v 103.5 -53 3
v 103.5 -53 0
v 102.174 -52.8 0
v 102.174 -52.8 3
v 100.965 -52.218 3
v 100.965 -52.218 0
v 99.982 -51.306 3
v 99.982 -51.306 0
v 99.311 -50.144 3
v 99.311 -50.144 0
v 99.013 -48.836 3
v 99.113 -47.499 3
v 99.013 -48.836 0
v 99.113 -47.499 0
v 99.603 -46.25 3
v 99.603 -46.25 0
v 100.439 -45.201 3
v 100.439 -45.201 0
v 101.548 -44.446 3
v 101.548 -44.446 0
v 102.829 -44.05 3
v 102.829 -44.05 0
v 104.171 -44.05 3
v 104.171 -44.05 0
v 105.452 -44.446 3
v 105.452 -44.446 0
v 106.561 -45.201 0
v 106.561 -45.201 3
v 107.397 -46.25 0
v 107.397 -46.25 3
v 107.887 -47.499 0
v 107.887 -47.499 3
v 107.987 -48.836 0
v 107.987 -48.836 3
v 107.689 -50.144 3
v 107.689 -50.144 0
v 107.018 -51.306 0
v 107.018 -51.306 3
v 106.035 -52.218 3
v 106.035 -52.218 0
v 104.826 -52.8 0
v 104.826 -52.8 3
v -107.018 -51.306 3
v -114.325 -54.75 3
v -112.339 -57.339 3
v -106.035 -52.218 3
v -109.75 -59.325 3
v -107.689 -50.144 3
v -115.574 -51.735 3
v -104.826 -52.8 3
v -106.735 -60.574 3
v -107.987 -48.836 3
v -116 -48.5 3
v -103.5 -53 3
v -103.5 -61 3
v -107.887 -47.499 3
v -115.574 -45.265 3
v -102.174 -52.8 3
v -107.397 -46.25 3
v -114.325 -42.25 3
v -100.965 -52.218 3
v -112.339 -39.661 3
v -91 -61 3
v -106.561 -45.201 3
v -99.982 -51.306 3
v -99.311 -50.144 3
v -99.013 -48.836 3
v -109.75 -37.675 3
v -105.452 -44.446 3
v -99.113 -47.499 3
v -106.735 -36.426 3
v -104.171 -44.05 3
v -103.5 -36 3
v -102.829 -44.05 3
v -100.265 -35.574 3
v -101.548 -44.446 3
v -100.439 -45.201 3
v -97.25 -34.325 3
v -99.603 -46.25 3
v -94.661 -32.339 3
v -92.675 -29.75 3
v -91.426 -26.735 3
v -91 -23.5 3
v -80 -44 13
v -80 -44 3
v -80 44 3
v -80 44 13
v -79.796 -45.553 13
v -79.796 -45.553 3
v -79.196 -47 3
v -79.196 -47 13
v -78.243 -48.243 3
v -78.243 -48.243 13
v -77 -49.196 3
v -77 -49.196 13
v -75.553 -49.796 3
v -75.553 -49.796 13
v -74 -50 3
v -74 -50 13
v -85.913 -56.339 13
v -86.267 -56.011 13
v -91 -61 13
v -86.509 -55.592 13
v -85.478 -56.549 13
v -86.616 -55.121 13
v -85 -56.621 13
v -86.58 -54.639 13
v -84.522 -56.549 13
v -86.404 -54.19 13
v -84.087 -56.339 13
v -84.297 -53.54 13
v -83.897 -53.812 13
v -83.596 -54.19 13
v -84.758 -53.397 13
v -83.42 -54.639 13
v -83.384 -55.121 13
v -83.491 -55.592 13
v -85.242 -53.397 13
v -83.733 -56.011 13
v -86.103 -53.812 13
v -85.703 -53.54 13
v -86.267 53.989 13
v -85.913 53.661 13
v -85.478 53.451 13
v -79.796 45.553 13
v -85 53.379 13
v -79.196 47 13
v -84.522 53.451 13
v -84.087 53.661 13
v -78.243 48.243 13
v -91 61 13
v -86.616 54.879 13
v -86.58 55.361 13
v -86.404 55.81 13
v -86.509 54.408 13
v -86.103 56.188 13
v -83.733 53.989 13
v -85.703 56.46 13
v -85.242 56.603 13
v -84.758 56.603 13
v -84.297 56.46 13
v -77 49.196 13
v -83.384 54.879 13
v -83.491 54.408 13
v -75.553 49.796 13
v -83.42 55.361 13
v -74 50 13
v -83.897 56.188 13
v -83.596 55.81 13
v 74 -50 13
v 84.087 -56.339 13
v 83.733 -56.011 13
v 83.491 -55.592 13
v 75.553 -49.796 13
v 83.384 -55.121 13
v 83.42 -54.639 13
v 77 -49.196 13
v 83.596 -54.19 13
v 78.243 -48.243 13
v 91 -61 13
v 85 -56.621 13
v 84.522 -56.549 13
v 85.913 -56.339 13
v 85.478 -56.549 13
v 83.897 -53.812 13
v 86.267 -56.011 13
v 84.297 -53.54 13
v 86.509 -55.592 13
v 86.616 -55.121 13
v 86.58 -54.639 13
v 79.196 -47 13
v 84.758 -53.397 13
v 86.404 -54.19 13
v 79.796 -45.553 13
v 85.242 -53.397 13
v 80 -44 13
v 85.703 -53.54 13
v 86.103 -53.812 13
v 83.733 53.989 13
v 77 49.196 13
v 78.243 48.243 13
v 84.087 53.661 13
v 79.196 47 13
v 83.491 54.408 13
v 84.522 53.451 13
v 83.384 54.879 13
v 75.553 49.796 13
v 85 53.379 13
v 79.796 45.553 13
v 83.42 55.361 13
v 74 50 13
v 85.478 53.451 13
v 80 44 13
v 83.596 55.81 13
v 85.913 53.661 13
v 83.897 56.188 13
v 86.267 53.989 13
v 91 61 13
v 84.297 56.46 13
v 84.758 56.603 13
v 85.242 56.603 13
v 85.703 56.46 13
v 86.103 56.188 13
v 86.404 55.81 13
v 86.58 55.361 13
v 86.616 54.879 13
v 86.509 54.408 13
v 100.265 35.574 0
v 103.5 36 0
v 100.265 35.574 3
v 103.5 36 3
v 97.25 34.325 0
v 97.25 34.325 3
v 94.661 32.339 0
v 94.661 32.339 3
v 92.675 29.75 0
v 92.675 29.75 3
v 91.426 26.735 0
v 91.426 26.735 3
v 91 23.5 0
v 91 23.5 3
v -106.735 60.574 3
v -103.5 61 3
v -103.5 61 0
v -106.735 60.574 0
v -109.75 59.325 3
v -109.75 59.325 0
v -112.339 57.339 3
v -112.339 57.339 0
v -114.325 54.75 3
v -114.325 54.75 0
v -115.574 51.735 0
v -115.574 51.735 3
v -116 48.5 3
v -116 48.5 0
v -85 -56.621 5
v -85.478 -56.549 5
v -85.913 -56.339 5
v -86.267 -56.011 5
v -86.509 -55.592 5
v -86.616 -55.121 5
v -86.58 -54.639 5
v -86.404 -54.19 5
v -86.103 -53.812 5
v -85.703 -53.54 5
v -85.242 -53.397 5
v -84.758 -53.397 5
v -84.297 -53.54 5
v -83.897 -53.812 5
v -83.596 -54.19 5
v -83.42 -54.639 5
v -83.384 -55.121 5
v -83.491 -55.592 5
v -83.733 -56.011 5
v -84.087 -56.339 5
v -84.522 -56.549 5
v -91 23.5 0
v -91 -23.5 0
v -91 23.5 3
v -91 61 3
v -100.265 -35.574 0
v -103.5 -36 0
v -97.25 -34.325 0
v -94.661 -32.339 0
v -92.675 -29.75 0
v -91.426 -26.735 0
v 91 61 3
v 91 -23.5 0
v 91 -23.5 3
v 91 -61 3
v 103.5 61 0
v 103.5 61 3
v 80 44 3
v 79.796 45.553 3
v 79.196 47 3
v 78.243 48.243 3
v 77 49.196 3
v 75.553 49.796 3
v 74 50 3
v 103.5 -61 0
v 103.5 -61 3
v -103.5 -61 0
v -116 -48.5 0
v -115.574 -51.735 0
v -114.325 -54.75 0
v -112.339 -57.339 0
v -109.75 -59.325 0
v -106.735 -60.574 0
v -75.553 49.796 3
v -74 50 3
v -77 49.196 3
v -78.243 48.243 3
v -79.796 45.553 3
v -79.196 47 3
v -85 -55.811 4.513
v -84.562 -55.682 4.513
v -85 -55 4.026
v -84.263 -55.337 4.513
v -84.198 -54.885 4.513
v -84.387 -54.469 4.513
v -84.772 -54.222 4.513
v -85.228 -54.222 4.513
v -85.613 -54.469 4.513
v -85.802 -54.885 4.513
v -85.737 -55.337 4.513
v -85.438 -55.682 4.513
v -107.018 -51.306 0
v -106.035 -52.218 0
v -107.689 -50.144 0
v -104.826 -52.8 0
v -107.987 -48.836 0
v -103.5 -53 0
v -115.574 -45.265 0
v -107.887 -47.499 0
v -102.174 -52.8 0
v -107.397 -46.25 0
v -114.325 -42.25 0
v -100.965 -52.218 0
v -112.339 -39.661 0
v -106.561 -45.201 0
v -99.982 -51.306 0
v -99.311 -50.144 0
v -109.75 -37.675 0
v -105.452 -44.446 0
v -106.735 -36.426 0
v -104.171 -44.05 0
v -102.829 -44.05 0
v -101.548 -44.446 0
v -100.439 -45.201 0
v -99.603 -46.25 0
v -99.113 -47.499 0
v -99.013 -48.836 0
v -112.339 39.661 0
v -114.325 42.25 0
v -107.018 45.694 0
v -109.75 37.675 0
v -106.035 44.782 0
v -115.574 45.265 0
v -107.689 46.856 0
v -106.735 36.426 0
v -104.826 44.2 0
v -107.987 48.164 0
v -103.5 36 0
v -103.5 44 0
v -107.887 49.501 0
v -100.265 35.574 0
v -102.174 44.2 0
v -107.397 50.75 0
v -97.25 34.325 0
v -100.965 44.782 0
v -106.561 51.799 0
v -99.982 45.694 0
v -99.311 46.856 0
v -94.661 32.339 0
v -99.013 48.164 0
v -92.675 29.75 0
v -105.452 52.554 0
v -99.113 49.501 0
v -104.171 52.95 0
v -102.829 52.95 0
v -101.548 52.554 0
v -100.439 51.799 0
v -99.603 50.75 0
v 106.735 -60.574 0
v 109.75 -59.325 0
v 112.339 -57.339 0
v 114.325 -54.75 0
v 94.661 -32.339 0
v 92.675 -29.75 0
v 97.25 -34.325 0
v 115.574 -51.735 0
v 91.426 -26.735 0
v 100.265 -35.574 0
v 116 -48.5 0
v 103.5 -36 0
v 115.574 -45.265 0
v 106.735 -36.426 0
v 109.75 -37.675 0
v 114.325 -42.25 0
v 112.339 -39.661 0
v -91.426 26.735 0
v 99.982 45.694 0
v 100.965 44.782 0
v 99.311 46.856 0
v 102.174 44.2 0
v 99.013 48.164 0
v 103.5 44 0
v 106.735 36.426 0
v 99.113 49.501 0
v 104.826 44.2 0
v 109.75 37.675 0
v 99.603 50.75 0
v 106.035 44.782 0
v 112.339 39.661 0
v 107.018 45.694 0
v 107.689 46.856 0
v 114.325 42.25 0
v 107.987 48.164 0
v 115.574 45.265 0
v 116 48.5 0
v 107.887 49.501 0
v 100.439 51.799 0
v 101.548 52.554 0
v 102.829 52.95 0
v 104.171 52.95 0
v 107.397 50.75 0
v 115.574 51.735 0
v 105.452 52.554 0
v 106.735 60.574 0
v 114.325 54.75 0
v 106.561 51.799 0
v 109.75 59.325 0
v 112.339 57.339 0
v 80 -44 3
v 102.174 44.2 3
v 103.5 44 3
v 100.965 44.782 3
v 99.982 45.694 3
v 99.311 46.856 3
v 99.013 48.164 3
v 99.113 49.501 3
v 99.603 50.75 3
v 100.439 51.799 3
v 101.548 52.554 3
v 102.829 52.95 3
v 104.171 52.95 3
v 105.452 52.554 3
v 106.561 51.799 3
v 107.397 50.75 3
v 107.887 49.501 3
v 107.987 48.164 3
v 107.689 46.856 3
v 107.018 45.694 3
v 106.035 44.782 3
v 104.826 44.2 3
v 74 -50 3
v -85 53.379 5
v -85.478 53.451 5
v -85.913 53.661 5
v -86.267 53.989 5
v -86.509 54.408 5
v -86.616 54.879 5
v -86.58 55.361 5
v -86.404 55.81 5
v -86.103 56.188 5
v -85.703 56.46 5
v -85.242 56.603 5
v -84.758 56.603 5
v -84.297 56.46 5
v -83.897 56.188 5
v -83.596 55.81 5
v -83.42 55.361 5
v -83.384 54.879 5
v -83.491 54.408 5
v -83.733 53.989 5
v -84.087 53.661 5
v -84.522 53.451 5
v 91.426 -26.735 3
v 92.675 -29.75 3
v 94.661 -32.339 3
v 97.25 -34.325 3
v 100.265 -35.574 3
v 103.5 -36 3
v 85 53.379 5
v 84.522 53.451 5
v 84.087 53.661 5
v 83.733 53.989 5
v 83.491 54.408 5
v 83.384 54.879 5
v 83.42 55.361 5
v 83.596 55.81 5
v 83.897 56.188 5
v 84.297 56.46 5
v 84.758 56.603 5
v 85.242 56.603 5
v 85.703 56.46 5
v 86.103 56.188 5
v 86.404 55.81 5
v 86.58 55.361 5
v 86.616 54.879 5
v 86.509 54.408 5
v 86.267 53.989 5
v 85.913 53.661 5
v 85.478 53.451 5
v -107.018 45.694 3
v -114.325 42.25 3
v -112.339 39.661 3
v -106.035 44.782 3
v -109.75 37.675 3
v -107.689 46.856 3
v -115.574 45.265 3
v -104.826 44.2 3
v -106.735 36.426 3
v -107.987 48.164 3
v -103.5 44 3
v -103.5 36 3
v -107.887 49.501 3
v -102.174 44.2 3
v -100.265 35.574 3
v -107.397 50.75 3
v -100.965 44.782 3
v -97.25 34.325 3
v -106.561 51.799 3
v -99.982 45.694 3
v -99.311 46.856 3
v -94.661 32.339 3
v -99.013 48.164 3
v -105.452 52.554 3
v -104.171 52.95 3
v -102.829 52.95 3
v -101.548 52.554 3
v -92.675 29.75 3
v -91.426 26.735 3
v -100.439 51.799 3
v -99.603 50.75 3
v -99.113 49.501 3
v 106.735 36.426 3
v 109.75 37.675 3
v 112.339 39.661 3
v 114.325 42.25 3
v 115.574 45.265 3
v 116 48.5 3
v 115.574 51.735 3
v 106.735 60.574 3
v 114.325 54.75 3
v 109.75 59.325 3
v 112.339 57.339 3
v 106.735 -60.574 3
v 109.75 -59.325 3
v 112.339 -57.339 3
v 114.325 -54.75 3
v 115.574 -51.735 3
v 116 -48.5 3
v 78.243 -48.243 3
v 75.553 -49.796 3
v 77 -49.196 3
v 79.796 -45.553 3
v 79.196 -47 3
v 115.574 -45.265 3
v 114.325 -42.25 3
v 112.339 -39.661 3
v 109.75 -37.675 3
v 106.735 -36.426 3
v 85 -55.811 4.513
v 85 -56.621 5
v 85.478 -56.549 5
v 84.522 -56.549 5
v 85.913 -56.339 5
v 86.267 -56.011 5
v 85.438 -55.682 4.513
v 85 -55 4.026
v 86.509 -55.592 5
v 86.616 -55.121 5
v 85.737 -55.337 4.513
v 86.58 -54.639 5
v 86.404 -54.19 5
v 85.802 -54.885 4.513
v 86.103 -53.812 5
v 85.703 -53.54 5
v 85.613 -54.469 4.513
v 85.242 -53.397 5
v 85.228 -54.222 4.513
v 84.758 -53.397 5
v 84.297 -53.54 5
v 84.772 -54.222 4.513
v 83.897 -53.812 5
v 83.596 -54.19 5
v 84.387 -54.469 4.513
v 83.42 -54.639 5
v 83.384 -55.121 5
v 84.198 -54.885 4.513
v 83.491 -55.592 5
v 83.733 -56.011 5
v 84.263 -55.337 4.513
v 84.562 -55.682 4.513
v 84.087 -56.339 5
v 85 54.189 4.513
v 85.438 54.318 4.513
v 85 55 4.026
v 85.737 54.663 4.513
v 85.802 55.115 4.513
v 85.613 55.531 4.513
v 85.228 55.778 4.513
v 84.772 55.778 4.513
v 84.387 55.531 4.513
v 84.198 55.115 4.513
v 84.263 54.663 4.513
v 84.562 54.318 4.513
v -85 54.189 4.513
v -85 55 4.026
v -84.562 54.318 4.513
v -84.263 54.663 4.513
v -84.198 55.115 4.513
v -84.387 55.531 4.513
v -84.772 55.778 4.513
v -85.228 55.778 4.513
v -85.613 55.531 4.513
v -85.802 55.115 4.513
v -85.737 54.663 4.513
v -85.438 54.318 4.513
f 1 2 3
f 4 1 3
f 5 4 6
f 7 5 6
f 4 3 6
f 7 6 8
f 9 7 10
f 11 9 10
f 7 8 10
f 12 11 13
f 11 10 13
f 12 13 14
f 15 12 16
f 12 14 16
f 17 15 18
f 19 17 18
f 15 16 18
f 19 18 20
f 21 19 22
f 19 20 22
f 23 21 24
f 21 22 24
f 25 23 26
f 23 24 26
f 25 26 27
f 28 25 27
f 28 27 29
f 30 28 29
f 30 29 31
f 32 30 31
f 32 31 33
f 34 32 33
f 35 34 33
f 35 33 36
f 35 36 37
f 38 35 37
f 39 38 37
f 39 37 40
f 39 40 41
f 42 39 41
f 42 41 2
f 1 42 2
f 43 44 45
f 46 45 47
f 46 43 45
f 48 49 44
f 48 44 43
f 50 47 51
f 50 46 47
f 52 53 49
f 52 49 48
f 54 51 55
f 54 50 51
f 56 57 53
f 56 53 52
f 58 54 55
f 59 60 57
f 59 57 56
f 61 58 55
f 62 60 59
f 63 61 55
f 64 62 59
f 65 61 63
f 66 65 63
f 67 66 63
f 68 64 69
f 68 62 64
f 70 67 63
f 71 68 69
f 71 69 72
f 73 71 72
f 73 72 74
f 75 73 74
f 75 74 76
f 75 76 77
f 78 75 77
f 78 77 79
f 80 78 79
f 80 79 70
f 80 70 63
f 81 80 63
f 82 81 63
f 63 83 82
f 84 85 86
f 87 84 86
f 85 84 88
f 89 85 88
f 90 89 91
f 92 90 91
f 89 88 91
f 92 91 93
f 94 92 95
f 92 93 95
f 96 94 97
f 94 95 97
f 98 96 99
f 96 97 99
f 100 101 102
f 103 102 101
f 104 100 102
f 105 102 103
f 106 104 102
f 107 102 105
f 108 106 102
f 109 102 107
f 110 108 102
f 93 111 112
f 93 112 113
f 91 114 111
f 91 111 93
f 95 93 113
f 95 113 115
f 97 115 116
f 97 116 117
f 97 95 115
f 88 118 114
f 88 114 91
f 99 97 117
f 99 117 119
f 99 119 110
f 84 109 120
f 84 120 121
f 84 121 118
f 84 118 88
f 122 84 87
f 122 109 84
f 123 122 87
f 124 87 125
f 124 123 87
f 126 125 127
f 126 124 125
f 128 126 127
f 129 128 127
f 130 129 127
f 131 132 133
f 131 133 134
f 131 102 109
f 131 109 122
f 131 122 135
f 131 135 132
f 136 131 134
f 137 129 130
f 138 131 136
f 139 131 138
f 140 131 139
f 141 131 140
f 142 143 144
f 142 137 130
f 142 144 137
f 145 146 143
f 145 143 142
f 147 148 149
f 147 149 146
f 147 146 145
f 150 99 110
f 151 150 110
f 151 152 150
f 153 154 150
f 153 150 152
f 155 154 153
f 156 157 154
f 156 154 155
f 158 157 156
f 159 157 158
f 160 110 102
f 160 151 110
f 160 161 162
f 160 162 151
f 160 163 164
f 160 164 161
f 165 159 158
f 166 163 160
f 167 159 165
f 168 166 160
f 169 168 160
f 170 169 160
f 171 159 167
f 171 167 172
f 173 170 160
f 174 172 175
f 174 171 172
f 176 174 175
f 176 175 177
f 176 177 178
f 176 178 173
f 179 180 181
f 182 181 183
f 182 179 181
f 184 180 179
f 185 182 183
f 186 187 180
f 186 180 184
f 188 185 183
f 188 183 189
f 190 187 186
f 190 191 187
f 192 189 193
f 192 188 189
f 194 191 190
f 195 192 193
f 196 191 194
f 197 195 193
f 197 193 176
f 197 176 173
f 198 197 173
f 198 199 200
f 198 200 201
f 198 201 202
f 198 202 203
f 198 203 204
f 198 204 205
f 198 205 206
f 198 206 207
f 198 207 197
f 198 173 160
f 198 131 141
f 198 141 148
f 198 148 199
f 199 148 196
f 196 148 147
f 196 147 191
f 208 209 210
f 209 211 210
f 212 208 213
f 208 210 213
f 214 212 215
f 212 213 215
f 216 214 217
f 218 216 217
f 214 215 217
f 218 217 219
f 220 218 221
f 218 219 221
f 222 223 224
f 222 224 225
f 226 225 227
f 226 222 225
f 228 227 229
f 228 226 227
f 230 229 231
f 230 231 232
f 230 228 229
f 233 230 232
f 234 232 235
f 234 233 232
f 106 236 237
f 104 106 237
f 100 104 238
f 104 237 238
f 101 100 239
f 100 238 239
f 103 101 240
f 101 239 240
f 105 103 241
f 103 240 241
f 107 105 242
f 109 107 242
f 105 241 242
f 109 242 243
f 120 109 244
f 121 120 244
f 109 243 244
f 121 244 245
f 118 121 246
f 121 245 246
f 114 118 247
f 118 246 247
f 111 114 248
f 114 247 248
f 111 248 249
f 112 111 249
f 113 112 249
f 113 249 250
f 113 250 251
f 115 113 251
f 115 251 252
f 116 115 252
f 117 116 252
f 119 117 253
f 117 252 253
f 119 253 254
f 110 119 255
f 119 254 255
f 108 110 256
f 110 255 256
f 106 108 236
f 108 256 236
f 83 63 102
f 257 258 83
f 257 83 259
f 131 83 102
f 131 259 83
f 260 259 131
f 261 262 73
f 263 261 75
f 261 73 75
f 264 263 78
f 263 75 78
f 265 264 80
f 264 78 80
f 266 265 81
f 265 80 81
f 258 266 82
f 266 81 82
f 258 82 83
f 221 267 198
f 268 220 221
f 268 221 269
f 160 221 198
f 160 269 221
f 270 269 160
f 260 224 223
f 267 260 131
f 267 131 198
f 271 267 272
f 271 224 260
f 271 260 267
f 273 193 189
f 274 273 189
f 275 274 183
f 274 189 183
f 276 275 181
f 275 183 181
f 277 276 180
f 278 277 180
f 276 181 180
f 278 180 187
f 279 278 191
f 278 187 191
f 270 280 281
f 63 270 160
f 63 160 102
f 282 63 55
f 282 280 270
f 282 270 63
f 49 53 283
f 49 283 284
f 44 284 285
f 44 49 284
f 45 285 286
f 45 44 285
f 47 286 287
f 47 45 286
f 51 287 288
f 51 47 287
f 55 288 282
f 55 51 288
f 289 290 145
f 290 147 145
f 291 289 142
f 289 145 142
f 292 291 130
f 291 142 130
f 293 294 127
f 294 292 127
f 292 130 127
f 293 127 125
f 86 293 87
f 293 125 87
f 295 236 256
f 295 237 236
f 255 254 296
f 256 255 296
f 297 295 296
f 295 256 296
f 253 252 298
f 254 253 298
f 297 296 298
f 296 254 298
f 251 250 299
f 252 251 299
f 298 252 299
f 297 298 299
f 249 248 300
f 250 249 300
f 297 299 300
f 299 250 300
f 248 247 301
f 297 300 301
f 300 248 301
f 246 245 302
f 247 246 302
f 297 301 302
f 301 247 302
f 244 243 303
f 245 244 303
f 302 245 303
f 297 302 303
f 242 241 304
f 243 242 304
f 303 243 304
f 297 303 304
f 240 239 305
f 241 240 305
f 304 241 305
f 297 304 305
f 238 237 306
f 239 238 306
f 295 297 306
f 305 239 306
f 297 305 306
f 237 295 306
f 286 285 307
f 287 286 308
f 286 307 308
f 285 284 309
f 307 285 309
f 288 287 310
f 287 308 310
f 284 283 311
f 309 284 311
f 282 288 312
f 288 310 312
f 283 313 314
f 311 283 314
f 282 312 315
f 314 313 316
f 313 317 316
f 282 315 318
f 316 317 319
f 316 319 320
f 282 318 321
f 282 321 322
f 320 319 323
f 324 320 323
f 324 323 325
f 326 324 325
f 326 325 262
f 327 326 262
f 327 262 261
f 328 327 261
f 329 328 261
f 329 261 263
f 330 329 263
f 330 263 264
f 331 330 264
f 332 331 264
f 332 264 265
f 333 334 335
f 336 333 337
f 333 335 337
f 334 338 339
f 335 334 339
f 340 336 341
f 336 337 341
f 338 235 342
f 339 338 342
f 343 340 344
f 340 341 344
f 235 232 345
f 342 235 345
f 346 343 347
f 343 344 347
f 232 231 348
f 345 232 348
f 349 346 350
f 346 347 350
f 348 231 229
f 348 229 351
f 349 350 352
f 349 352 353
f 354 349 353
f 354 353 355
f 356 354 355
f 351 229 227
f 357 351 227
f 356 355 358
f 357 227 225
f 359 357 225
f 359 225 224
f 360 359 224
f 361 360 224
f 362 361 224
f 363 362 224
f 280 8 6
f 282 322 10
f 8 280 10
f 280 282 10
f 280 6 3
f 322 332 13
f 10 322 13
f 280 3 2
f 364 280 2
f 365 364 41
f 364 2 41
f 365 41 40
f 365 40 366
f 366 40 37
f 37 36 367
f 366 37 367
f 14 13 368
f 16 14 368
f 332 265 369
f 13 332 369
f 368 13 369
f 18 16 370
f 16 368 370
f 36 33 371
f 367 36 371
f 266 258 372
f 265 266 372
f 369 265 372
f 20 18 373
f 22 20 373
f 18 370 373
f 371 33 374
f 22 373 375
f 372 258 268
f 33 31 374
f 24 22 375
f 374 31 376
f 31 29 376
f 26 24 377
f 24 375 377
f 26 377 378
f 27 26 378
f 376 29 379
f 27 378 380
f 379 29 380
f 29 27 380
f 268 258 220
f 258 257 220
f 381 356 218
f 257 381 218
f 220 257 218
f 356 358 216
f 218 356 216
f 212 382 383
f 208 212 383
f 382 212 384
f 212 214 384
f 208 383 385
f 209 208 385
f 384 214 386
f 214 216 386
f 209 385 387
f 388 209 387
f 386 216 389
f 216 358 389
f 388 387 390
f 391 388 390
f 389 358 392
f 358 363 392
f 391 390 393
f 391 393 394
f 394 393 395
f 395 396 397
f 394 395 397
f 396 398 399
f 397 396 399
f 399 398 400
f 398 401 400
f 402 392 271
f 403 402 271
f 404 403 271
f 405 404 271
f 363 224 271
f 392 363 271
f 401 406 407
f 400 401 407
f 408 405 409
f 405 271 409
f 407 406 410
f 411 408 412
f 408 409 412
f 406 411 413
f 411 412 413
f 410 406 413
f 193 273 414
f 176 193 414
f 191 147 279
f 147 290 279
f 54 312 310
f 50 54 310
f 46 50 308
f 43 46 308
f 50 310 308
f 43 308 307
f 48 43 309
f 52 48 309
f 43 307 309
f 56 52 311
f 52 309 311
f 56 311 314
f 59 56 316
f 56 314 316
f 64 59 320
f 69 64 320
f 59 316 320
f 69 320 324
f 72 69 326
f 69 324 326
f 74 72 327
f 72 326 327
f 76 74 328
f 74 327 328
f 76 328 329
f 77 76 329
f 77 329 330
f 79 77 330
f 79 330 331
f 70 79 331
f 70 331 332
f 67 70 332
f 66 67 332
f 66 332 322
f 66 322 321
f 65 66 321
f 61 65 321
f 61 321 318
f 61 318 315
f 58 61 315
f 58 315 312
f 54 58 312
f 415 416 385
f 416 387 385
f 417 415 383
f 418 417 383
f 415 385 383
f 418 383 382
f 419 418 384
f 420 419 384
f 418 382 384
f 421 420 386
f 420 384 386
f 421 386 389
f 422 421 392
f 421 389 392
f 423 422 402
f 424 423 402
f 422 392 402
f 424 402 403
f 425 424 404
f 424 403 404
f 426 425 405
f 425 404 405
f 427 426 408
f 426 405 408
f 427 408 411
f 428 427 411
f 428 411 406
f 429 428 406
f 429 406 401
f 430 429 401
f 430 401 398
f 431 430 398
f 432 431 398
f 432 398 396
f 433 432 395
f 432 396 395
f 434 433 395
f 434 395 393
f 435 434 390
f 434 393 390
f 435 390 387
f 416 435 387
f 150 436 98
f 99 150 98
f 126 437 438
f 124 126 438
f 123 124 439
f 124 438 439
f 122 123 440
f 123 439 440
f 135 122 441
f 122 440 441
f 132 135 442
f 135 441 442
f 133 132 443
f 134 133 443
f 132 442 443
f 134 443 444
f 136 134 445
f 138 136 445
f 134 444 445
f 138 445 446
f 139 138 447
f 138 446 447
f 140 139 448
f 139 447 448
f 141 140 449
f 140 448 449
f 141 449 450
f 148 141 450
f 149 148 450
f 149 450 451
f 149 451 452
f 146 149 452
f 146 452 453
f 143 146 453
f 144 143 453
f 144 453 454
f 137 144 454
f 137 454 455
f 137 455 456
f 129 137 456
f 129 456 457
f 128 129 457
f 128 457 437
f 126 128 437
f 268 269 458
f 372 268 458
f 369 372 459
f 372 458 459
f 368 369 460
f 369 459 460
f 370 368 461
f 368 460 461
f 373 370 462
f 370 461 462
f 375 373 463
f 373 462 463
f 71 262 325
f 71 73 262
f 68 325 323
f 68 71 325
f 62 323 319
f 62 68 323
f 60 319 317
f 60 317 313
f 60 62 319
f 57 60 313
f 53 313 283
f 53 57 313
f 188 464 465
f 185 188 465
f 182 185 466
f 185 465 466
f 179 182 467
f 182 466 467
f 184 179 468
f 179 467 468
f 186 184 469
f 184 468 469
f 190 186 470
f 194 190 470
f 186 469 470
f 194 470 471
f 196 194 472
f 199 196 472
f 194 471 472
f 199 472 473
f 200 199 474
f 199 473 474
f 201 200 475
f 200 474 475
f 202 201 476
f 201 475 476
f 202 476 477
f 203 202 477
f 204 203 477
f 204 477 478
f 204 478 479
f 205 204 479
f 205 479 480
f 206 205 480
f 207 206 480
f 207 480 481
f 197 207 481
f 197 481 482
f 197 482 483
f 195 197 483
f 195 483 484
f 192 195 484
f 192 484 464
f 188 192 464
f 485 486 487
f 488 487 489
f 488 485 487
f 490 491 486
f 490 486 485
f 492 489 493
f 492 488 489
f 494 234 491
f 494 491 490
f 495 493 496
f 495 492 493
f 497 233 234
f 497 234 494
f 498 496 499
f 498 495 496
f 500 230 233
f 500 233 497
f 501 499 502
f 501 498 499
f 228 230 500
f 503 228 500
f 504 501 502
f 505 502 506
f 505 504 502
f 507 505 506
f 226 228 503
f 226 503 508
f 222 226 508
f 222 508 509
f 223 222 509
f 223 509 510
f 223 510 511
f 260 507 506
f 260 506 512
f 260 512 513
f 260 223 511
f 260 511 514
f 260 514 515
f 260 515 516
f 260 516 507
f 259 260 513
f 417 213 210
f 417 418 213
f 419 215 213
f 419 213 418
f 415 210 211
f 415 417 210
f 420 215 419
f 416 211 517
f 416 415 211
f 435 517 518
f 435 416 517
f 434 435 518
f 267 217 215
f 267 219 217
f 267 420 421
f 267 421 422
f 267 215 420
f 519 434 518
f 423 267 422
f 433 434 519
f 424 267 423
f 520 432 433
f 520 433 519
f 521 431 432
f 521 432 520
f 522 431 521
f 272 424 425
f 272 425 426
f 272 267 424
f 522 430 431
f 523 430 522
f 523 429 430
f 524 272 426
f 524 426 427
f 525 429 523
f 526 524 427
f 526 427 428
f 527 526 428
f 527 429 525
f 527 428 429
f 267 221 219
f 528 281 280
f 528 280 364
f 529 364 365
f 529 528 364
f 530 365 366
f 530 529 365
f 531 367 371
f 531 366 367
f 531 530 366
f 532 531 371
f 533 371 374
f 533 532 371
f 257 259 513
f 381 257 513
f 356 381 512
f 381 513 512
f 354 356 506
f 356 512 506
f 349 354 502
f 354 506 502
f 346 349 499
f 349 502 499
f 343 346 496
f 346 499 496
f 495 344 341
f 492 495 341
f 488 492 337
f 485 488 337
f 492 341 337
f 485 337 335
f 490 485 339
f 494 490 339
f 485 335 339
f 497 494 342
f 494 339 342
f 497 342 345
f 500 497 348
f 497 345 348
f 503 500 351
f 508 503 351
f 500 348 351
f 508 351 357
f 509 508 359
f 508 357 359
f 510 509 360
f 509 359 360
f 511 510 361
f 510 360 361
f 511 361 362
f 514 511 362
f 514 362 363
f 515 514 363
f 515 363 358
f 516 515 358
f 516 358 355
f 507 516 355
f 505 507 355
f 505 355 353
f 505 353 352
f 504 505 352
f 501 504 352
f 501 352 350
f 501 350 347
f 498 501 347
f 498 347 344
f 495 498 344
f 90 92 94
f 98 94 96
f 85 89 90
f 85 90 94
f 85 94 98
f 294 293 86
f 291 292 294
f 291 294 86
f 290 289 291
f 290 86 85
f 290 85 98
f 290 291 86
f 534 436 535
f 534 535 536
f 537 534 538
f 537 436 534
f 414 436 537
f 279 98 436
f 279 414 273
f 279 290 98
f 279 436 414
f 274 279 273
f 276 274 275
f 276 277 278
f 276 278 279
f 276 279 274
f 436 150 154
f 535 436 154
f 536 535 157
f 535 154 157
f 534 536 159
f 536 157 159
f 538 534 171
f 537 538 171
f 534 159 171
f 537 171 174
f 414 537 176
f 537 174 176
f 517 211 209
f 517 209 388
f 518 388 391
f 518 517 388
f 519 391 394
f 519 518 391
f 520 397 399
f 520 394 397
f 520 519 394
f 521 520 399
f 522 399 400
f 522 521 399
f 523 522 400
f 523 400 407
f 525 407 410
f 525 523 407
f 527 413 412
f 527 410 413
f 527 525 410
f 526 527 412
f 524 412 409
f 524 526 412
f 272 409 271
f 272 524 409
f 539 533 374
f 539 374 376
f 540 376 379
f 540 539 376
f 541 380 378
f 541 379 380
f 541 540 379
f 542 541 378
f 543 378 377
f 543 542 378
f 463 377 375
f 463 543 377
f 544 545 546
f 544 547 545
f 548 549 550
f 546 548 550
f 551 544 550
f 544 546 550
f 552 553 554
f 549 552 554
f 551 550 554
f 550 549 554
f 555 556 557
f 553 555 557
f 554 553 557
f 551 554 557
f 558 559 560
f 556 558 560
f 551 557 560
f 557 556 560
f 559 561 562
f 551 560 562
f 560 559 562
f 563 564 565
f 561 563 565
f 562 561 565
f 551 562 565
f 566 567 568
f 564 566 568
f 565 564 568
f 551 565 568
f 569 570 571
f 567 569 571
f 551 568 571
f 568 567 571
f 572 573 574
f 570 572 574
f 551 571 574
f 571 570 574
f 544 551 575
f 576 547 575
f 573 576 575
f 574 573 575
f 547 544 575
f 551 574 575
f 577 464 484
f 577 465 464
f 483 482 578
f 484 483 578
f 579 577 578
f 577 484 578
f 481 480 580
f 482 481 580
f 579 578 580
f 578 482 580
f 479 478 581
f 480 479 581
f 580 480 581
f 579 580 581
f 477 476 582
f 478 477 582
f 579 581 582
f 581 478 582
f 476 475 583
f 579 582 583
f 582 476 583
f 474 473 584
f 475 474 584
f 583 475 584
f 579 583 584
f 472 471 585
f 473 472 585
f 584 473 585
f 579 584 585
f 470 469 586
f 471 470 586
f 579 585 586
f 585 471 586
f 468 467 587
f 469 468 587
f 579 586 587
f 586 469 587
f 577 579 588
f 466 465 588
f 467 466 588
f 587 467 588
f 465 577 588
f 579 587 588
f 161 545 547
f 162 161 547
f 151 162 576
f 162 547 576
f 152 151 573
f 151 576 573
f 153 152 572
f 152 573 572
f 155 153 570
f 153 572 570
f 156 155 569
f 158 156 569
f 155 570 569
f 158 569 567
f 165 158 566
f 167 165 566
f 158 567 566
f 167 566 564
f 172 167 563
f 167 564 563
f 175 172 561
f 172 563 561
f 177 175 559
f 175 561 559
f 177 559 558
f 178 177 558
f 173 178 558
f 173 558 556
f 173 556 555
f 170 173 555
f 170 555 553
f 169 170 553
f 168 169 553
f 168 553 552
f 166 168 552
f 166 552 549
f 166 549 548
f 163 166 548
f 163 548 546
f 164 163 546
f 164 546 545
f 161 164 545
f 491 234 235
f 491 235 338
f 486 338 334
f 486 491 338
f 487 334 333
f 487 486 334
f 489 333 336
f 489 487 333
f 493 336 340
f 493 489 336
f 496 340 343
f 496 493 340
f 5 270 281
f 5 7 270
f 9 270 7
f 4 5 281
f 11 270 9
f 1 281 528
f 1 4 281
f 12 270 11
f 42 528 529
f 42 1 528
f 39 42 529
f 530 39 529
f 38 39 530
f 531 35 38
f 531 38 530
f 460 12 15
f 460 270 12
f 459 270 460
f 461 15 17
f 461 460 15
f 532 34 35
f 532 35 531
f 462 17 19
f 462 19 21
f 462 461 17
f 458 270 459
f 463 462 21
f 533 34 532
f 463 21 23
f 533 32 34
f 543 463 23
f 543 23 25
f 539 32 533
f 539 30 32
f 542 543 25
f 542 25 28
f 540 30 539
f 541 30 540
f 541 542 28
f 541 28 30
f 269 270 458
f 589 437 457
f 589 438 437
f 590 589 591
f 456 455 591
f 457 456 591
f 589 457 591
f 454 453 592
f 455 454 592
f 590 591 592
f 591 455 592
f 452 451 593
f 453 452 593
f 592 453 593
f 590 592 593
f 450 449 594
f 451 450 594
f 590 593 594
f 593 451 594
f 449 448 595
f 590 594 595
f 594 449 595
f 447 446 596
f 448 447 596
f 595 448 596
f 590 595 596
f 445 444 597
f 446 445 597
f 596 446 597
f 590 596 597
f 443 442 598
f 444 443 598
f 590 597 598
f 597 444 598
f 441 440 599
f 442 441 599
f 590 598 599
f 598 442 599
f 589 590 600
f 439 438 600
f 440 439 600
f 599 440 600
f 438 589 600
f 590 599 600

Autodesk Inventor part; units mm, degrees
ref_plane "YZ Plane" through (0, 0, 0) normal (1, 0, 0) x (0, 1, 0)
ref_plane "XZ Plane" through (0, 0, 0) normal (0, 1, 0) x (-1, 0, 0)
ref_plane "XY Plane" through (0, 0, 0) normal (0, 0, 1) x (1, 0, 0)
sketch "Sketch1" plane through (0, 0, 0) normal (0, 0, 1) x (1, 0, 0)
  line L0 (-83, 53) -> (83, 53) construction
  line L1 (83, 53) -> (83, -53) construction
  line L2 (83, -53) -> (-83, -53) construction
  line L3 (-83, -53) -> (-83, 53) construction
  line L4 (-83, -53) -> (83, 53) construction
  line L5 (83, -53) -> (-83, 53) construction
  line L6 (-91, 61) -> (91, 61)
  line L7 (91, 61) -> (91, -61)
  line L8 (91, -61) -> (-91, -61)
  line L9 (-91, -61) -> (-91, 61)
  line L10 (-91, 61) -> (91, -61) construction
  line L11 (-91, -61) -> (91, 61) construction
  line L12 (-91, 61) -> (-116, 61)
  line L13 (-116, 61) -> (-116, 36)
  line L14 (-116, 36) -> (-91, 36)
  line L15 (-91, 36) -> (-91, 61)
  line L16 (0, 0) -> (-160.1953, 0) construction
  line L17 (-91, -61) -> (-116, -61)
  line L18 (-116, -61) -> (-116, -36)
  line L19 (-116, -36) -> (-91, -36)
  line L20 (-91, -36) -> (-91, -61)
  line L21 (0, 0) -> (0, 107.5555) construction
  line L22 (91, -61) -> (91, 61)
  line L23 (91, 61) -> (116, 61)
  line L24 (116, 61) -> (116, 36)
  line L25 (116, 36) -> (91, 36)
  line L26 (91, 36) -> (91, 61)
  line L27 (91, -36) -> (91, -61)
  line L28 (91, -61) -> (116, -61)
  line L29 (116, -61) -> (116, -36)
  line L30 (116, -36) -> (91, -36)
  point P0 (0, 0)
  point P1 (0, 0)
  dimension "d0" = 166
  dimension "d1" = 106
  dimension "d2" = 8
  dimension "d3" = 8
  dimension "d4" = 25
  dimension "d5" = 25
extrude "Extrusion1" add sketch "Sketch1" along normal blind 3
sketch "Sketch2" plane through (0, 0, 3) normal (0, 0, 1) x (1, 0, 0)
  line L0 (-116, 61) -> (116, 61) projected
  line L1 (-116, 36) -> (-116, 61) projected
  line L2 (116, 61) -> (116, 36) projected
  circle A0 centre (-103.5, 48.5) radius 1
  line L3 (0, 0) -> (-24.3275, 0) construction
  line L4 (0, 0) -> (0, 26.5856) construction
  circle A1 centre (-103.5, -48.5) radius 1
  circle A2 centre (103.5, 48.5) radius 1
  circle A3 centre (103.5, -48.5) radius 1
  dimension "d8" = 2
  dimension "d9" = 12.5
  dimension "d10" = 12.5
hole "Hole1" at (-103.5, 48.5, 3) at (-103.5, -48.5, 3) at (103.5, -48.5, 3) at (103.5, 48.5, 3) direction (0, 0, -1) diameter 9 depth 8 tip angle 118 clearance for "Flat Head Machine Screw" size "M8" standard "Ansi Metric M Profile"
fillet "Fillet1" radius 12.5 12 edges at (116, 61, 1.5) (116, 36, 1.5) (91, 36, 1.5) (91, -36, 1.5) (116, -36, 1.5) (116, -61, 1.5) (-116, -61, 1.5) (-116, -36, 1.5) (-91, -36, 1.5) (-91, 36, 1.5) (-116, 36, 1.5) (-116, 61, 1.5)
sketch "Sketch3" plane through (0, 0, 3) normal (0, 0, 1) x (1, 0, 0)
  line L0 (103.5, -61) -> (-103.5, -61) projected
  line L1 (-103.5, 61) -> (103.5, 61) projected
  line L2 (-91, 61) -> (91, 61)
  line L3 (91, 61) -> (91, -61)
  line L4 (91, -61) -> (-91, -61)
  line L5 (-91, -61) -> (-91, 61)
  line L6 (-80, 50) -> (80, 50)
  line L7 (80, 50) -> (80, -50)
  line L8 (80, -50) -> (-80, -50)
  line L9 (-80, -50) -> (-80, 50)
  line L10 (-80, 50) -> (80, -50) construction
  line L11 (-80, -50) -> (80, 50) construction
  line L12 (-91, -23.5) -> (-91, 23.5) projected
  point P0 (0, 0)
  dimension "d19" = 100
  dimension "d20" = 160
extrude "Extrusion2" add sketch "Sketch3" along normal blind 10
fillet "Fillet2" radius 6 4 edges at (-80, 50, 8) (-80, -50, 8) (80, -50, 8) (80, 50, 8)
sketch "Sketch6" plane through (0, 0, 13) normal (0, 0, 1) x (1, 0, 0)
  line L0 (-91, 61) -> (91, 61) projected
  line L1 (-91, -61) -> (-91, 61) projected
  circle A0 centre (-85, 55) radius 2
  line L2 (0, 0) -> (-11.4122, 0) construction
  line L3 (0, 0) -> (0, 13.6861) construction
  circle A1 centre (-85, -55) radius 2
  circle A2 centre (85, 55) radius 2
  circle A3 centre (85, -55) radius 2
  dimension "d33" = 4
  dimension "d34" = 6
  dimension "d35" = 6
hole "Hole2" at (-85, 55, 13) at (-85, -55, 13) at (85, -55, 13) at (85, 55, 13) direction (0, 0, -1) diameter 3.242 depth 8 tip angle 118 thread size "M4x0.7" class "6H" standard "ANSI Metric M Profile"
equation "\"d34\" = 1.5 * d33"
equation "\"d35\" = 1.5 * d33"
properties part number "Base.Box.Base"
